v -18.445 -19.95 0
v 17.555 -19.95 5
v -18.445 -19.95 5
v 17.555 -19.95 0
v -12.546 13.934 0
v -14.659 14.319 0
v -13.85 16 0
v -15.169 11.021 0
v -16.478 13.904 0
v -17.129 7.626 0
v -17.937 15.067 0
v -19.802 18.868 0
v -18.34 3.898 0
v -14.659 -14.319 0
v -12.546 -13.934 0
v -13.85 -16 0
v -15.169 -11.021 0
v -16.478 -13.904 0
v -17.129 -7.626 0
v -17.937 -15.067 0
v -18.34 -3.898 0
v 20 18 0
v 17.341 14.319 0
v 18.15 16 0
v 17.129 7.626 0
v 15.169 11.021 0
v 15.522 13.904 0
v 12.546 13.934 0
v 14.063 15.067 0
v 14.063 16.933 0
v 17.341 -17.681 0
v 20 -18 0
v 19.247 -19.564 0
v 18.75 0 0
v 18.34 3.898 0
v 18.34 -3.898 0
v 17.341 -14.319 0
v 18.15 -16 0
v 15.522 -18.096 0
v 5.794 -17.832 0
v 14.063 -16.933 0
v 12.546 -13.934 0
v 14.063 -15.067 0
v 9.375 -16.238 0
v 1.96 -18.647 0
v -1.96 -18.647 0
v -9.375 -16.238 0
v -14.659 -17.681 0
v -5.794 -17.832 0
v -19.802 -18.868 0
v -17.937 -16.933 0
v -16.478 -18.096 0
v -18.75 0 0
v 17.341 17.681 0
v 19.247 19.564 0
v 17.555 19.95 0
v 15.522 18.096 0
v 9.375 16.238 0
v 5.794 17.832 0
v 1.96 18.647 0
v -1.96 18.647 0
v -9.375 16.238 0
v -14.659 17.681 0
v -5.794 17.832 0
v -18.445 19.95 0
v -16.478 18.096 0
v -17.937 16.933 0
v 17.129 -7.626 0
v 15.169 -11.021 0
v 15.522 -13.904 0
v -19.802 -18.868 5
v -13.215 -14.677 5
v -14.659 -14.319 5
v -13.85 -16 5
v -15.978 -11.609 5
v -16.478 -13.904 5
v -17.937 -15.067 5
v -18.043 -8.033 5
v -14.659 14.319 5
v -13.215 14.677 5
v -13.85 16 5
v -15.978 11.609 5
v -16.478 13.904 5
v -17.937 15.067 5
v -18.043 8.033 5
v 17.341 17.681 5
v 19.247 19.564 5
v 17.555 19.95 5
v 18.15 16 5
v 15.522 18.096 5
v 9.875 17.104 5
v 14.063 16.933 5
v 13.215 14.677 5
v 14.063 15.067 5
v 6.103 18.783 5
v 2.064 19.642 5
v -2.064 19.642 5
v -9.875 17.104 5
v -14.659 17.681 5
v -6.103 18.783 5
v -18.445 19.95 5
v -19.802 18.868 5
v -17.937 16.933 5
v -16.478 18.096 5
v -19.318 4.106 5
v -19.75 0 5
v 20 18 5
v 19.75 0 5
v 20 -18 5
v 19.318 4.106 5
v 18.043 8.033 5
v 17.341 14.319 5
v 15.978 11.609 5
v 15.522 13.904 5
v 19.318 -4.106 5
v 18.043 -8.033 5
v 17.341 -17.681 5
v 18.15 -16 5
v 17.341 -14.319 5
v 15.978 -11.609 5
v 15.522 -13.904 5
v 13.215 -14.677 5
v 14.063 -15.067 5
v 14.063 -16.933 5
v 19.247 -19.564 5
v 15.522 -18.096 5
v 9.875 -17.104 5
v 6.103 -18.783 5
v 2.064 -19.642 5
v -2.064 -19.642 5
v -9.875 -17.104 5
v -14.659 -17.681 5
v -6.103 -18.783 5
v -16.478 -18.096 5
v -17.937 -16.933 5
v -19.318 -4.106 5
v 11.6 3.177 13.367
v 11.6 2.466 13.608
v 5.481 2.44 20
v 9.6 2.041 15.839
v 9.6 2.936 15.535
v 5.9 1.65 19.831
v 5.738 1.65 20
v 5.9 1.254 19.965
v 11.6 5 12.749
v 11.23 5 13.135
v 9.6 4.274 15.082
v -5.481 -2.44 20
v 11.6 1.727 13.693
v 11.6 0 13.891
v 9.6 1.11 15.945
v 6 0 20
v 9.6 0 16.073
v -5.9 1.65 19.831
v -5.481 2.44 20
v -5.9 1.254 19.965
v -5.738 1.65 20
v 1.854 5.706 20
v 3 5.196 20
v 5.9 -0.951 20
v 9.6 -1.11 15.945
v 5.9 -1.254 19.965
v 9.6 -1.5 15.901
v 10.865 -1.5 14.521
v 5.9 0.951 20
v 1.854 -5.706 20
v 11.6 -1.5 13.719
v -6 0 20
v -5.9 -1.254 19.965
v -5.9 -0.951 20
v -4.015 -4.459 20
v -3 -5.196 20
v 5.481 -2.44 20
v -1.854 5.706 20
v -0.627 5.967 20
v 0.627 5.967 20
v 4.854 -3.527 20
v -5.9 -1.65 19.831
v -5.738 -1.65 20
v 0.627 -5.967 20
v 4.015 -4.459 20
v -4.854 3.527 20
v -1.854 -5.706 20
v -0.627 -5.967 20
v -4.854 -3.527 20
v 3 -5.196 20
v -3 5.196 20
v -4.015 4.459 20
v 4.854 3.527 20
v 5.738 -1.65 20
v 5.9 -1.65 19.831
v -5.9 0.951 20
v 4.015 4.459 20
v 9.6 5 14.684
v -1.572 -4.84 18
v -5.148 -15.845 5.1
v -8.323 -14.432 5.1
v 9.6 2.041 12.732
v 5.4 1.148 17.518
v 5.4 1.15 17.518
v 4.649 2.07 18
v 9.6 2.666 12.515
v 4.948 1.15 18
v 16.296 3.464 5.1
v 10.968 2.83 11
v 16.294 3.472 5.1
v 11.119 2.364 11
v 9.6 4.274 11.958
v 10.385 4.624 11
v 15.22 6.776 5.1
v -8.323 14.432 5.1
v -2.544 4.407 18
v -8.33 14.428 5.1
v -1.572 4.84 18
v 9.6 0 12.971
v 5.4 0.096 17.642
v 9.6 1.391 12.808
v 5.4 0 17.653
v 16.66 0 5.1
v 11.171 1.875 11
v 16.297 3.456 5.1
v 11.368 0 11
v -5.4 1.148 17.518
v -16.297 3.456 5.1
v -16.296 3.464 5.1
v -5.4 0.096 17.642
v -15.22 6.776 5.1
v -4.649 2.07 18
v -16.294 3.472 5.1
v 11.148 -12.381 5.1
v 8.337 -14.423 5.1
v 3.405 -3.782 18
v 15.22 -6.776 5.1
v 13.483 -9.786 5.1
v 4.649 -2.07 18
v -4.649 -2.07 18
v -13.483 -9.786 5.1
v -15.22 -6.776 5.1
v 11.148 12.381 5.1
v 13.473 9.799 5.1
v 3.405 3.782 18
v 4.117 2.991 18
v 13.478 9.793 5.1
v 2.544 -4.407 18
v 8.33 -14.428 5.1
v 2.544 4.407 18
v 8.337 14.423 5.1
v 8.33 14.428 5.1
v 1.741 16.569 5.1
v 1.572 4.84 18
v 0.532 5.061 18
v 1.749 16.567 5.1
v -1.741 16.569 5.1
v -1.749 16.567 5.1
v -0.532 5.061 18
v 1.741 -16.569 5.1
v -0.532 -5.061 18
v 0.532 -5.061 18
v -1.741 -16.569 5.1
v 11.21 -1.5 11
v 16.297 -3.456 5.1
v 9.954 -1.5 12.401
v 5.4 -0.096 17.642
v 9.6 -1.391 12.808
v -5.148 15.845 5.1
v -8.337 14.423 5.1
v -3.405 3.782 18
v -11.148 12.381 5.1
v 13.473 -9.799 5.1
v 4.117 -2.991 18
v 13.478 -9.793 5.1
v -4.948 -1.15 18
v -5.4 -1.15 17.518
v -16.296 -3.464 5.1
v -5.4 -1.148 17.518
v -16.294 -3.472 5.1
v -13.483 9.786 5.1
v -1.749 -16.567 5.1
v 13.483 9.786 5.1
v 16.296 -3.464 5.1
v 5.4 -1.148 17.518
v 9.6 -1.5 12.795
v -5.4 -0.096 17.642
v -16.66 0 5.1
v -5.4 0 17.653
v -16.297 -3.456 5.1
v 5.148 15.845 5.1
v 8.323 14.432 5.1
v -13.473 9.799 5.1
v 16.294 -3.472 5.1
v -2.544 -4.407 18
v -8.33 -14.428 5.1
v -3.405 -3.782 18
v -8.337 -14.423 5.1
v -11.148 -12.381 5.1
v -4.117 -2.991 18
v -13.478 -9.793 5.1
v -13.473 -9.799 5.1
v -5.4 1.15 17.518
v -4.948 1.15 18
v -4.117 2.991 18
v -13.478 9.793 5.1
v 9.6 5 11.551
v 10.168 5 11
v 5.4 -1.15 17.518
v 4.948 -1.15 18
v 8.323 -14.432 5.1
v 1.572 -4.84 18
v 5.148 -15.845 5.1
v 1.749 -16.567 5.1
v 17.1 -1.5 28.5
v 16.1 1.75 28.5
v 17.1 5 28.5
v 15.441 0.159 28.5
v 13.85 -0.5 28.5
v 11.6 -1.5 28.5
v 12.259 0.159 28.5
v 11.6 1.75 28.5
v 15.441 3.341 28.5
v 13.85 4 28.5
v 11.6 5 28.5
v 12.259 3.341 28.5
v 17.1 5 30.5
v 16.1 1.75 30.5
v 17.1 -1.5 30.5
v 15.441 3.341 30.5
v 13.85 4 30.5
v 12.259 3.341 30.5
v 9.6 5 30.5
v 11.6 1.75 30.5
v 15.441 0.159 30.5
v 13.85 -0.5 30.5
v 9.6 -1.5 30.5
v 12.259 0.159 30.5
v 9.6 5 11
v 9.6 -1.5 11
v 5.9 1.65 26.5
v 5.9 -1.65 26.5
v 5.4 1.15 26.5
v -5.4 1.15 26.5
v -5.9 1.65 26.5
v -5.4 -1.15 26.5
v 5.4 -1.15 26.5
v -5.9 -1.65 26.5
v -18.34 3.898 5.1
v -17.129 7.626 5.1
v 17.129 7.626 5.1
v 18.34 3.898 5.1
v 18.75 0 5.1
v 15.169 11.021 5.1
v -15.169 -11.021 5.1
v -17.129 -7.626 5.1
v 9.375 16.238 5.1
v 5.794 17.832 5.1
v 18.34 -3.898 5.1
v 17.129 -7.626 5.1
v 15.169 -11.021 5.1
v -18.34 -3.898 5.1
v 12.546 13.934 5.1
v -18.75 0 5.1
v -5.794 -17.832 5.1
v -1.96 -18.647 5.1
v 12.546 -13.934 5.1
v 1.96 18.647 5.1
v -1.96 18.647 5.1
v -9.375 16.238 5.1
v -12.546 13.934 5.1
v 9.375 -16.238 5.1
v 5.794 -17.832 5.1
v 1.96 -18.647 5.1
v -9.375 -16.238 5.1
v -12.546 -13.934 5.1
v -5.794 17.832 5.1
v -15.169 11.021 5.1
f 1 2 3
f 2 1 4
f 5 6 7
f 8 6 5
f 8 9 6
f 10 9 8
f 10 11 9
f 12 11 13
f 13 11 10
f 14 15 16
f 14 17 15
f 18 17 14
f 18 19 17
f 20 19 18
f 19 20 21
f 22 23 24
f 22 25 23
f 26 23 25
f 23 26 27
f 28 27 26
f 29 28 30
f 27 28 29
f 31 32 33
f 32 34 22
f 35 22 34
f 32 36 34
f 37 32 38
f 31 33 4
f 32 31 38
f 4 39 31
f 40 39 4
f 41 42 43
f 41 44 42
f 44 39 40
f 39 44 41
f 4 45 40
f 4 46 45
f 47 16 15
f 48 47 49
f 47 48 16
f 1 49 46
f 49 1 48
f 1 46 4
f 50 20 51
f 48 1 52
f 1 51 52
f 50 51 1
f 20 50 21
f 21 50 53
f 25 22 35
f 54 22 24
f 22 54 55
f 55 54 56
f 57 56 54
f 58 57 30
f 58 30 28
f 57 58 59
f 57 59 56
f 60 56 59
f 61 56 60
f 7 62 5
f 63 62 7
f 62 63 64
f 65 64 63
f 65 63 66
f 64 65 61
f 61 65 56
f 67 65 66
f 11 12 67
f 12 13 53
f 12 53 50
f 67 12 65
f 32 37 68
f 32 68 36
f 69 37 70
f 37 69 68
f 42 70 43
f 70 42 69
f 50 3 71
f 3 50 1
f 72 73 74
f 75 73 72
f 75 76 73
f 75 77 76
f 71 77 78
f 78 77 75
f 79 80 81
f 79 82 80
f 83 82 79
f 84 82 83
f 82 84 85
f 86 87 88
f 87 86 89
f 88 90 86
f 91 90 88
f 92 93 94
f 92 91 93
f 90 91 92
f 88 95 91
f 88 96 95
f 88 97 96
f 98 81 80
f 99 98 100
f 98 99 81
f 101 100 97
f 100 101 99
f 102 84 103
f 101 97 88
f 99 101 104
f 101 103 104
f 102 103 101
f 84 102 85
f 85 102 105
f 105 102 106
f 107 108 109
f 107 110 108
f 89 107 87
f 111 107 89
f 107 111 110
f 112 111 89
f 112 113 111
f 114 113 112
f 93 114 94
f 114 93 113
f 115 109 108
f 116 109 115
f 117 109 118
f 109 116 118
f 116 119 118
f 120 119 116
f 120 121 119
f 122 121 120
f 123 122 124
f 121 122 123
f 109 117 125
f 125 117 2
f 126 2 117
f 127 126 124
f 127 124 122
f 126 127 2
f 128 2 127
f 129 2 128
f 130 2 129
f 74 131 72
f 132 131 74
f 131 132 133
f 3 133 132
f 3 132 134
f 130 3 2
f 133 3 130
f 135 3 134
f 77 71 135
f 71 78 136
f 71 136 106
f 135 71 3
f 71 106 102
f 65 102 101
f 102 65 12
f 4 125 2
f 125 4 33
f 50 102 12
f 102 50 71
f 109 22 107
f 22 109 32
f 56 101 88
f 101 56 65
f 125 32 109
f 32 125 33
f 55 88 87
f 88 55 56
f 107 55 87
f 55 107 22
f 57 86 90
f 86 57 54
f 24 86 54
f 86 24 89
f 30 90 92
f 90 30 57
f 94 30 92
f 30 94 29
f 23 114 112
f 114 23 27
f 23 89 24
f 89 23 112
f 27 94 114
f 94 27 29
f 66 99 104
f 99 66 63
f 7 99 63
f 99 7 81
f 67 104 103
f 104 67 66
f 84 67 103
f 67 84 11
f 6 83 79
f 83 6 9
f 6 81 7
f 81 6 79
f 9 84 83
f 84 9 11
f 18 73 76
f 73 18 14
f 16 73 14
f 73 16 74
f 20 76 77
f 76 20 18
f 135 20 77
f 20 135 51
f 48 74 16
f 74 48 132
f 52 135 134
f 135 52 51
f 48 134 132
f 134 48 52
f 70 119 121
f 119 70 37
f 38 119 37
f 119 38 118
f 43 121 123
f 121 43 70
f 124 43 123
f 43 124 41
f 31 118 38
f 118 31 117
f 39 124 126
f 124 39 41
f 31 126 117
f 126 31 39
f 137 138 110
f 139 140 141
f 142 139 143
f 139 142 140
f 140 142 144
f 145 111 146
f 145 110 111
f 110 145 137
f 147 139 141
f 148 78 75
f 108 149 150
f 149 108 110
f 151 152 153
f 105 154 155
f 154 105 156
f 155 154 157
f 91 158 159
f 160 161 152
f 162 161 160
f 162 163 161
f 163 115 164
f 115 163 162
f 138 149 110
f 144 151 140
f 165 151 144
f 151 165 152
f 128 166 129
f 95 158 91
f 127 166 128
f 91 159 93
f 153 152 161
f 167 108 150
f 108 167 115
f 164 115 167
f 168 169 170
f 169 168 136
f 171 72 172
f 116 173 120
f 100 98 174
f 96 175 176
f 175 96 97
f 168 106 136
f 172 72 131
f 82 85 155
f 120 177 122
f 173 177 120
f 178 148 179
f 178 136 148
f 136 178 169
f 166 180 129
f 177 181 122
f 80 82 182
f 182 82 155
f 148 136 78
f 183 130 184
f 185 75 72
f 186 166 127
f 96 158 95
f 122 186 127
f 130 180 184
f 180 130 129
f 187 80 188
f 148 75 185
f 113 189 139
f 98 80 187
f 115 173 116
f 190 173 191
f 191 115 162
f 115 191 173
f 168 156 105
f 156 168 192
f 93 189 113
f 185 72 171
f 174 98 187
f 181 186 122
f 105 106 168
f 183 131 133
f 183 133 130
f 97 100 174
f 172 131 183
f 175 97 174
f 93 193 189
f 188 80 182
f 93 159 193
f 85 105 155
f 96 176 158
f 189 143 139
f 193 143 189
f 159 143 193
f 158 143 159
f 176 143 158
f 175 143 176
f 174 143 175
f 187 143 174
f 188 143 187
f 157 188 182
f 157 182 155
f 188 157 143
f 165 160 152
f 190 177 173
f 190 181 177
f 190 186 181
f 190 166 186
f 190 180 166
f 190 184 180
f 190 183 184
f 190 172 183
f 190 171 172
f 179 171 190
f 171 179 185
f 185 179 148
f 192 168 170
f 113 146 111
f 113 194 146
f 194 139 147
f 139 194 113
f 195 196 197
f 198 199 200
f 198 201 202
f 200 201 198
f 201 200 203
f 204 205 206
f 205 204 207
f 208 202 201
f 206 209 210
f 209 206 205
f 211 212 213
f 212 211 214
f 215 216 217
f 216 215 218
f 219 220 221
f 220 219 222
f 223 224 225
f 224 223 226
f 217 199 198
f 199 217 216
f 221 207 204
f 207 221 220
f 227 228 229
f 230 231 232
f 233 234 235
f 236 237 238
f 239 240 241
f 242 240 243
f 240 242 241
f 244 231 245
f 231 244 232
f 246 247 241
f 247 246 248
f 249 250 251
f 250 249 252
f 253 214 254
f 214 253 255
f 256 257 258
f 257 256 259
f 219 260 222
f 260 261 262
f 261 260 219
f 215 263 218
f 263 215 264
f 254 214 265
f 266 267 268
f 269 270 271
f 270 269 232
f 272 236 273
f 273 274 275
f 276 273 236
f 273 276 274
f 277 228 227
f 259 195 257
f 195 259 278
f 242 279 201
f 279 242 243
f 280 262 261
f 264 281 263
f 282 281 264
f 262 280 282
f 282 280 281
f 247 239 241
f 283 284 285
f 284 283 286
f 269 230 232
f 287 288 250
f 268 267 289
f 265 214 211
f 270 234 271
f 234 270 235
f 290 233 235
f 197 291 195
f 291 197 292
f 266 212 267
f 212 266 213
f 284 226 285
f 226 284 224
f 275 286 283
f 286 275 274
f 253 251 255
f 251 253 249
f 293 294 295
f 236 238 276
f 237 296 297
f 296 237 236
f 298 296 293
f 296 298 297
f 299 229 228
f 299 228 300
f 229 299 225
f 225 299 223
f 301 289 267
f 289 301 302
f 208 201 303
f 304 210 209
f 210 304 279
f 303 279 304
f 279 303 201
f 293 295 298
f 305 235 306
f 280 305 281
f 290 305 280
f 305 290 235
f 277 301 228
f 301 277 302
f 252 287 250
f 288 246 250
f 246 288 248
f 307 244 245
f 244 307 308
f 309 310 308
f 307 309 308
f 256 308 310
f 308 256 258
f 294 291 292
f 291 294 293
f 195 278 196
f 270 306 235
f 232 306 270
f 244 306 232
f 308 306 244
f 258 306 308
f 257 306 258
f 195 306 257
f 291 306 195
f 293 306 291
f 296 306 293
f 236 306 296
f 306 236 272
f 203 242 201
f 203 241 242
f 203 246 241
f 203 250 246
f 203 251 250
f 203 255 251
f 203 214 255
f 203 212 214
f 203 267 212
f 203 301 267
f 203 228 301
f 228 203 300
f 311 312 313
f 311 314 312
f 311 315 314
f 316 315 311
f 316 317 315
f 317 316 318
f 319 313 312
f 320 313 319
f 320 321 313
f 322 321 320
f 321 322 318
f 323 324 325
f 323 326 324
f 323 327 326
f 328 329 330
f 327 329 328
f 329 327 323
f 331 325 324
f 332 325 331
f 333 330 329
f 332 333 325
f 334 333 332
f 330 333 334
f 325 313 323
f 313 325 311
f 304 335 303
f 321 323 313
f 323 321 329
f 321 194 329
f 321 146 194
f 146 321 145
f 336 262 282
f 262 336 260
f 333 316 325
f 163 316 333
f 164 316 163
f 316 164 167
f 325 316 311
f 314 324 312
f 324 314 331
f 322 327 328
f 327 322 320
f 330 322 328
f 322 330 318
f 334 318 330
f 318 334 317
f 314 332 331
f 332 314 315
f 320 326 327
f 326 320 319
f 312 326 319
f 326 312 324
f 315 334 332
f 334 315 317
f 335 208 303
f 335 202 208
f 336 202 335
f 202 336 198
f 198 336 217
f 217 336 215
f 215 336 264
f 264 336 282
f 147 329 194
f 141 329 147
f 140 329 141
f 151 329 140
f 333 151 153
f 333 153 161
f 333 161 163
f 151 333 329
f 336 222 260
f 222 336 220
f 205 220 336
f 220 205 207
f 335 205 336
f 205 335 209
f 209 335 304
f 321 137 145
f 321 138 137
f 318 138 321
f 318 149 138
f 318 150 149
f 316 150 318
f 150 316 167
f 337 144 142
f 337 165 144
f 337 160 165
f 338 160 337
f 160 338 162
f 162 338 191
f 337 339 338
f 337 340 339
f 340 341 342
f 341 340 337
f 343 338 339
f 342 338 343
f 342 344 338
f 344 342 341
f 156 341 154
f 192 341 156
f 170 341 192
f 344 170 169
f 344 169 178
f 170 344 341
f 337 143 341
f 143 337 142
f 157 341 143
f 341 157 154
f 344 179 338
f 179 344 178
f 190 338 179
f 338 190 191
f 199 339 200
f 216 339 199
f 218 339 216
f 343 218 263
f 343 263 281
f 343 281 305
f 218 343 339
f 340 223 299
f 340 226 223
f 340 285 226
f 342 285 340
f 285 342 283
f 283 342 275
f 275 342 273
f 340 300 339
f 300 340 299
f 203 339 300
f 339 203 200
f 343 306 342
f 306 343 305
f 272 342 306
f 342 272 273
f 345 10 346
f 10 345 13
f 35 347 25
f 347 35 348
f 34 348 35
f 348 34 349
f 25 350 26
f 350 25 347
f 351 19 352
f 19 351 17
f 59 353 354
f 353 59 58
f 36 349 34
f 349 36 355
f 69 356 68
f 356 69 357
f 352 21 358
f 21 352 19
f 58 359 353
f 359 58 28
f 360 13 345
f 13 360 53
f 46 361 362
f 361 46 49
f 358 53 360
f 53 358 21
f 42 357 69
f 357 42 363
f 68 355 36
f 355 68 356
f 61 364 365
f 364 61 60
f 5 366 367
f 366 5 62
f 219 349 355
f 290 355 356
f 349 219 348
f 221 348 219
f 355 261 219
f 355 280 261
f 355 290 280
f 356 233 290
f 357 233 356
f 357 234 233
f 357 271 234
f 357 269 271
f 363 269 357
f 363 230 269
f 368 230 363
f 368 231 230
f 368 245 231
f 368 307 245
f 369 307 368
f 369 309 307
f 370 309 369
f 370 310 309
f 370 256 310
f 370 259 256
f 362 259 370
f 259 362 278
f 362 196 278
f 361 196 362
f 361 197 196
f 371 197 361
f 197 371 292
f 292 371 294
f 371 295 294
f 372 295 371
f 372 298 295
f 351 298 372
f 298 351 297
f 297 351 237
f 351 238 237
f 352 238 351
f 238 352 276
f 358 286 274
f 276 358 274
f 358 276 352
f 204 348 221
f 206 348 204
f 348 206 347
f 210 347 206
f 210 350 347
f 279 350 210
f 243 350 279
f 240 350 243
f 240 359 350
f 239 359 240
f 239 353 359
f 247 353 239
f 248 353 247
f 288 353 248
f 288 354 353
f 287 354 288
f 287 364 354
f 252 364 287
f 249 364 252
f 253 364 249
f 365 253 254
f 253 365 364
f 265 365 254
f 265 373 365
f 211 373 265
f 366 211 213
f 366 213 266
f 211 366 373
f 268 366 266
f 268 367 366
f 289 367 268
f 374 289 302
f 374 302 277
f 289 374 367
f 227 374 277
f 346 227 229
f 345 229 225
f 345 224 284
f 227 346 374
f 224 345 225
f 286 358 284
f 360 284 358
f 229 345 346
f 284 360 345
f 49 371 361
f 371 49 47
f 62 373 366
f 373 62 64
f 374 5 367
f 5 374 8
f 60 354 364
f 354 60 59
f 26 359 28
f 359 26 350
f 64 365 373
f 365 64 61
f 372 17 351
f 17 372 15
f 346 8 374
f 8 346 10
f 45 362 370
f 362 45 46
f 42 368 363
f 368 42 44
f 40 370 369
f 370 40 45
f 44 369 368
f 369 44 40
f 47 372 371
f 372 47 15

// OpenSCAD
//
// An air duct to pump air through the Shinyei PPD42NS PM sensor.
//

// sensor input hole (see http://sca-shinyei.com/pdf/PPD42NS.pdf)
sensorInX = 12.0;
sensorInY = 3.5;
sensorInZ = 7.0;
sensorScrewHole = 4.5;
sensorScrewSideToInDistance = 11.6;
sensorScrewToInDistance = sensorScrewSideToInDistance + (sensorScrewHole / 2); // to screw centre

// sensorBodyHeight is the top of black plastic to top of the board it sits on.
// spec says 15.5 with +0.5/-0.3. measuring the fablab saigon one it is 15.5.
sensorBodyHeight = 15.5; 
sensorInToScrewHole = sensorBodyHeight - 1.0; // slightly lower then the body

// input nozzle
nozzleReduction = 0.1 * 2; // allows nozzle to insert into sensorIn hole
nozzleX = sensorInX - nozzleReduction;
nozzleY = sensorInY - nozzleReduction;
nozzleZ = sensorInZ;
nozzleWallThickness = 0.5;

// fan (based on sunon 40mm fan specs: http://www.sunon.com/tw/products/pdf/acfan.pdf)
fanWidth = 40;
fanHoleDiameter = 37.5;
fanPlateThickness = 5;
fanPlateScrewHole = 4.3;
fanPlateDistanceBetweenScrews = 32;

// duct
ductHeight = 15;
ductWallThickness = 3;
ductTopThickness = 2;
ductBaseWidth = fanHoleDiameter + 2; // bit bigger then the hole
ductScale = sensorInX / ductBaseWidth;

// connector and screw plate
connectorArmDuctTopToDuctBody = 5; // to where the arm touches the body (TODO: calculate this)
connectorArmLength = sensorInToScrewHole + connectorArmDuctTopToDuctBody;
connectorArmWidth = 2;
connectorArmZOffset = connectorArmLength + // raise it the height of itself as it's inverted
                         ductHeight - connectorArmDuctTopToDuctBody; // raise to where it meets the duct wall
screwPlateWidth = sensorScrewHole + 2;
screwPlateHeight = 2;
screwPlateYOffset = sensorInY / 2; // screw centre aligns with top of the in hole

// nozzle outer (walls)
module nozzle_outer() {
    cube([nozzleX, nozzleY, nozzleZ], center=true);
}
// nozzle inner (air)
module nozzle_inner() {
    cube([nozzleX - (nozzleWallThickness * 2), 
          nozzleY - (nozzleWallThickness * 2), 
          nozzleZ + ductTopThickness + 2],  // enough to punch hole through top and bottom 
          center=true);
}

module duct() {
    difference() {
        // duct outer (walls)
        linear_extrude(height = ductHeight, scale = ductScale)
            circle(d=ductBaseWidth, center=true);
        // duct inner (air)
        ductInnerWidth = ductBaseWidth - (ductWallThickness * 2);
        linear_extrude(height = ductHeight-ductTopThickness, scale = ductScale)
            circle(d=ductInnerWidth, center=true);
    }
}

// Extended the fanplate from thingiverse:
//   Create by : Sherif Eid
//   sherif.eid@gmail.com
//   https://www.thingiverse.com/thing:735038
//
// Changes:
//  - added screw_hole module and extended the height and transform
//    positions of screw holes to ensure a complete hole
module fanplate(d,ls,t,ds) 
{
    /*
    d   : diameter of the fan
    ls  : distance between screws
    t   : wall thickness
    ds  : diameter of screws 
    */
    difference()
    {
        difference()
        {
            difference()
            {
                difference()
                {
                    translate([-0.45*d,-0.45*d,0]) minkowski()
                        { 
                         cube([d*0.9,d*0.9,t/2]);
                         cylinder(h=t/2,r=d*0.05);
                        }
                    screw_hole(ls/2, ls/2, ds, t);
                }
                screw_hole(ls/-2, ls/2, ds, t);
            }
            screw_hole(ls/-2, ls/-2, ds, t);
        }
        screw_hole(ls/2, ls/-2, ds, t);
    }
}
module screw_hole(tX, tY, ds, t) {
    translate([tX,tY,-1]) cylinder(d=ds,h=t+2);
}

module duct_to_sensor_connector() {
    rotate([180, 0, 180]) union() {
        // connecting arm
        translate([sensorScrewHole/2, -screwPlateWidth/2, -screwPlateHeight/2])
            cube([connectorArmWidth, screwPlateWidth, connectorArmLength]);
        // screw plate
        difference() {
            cube([screwPlateWidth, screwPlateWidth, screwPlateHeight], center=true);
            cylinder(d=sensorScrewHole, h=screwPlateHeight+0.2, center=true);
        }
    }
}


// Put together and add some holes
nozzlePositionZ = fanPlateThickness+ductHeight+3;
difference() {
    difference() {
        difference() {
            union() {
                fanplate(fanWidth, 
                        fanPlateDistanceBetweenScrews, 
                        fanPlateThickness, 
                        fanPlateScrewHole);
                translate([0, 0, fanPlateThickness]) 
                    duct();
                translate([0, 0, nozzlePositionZ]) 
                    nozzle_outer();
                translate([sensorScrewToInDistance,
                          screwPlateYOffset,
                          connectorArmZOffset])
                    duct_to_sensor_connector();        
            }
            translate([0, 0, nozzlePositionZ]) 
                nozzle_inner();
        }
        // fanplate hole breaking through the duct
        translate([0, 0, -0.1]) 
            cylinder(d=fanHoleDiameter, h=fanPlateThickness+0.2);
    }
    // punch a hole where the nozzle and duct join
    translate([0, 0, nozzlePositionZ-2])
        cube([nozzleX - (nozzleWallThickness * 2), 
              nozzleY - (nozzleWallThickness * 2), 
              3], 
              center=true);
}
